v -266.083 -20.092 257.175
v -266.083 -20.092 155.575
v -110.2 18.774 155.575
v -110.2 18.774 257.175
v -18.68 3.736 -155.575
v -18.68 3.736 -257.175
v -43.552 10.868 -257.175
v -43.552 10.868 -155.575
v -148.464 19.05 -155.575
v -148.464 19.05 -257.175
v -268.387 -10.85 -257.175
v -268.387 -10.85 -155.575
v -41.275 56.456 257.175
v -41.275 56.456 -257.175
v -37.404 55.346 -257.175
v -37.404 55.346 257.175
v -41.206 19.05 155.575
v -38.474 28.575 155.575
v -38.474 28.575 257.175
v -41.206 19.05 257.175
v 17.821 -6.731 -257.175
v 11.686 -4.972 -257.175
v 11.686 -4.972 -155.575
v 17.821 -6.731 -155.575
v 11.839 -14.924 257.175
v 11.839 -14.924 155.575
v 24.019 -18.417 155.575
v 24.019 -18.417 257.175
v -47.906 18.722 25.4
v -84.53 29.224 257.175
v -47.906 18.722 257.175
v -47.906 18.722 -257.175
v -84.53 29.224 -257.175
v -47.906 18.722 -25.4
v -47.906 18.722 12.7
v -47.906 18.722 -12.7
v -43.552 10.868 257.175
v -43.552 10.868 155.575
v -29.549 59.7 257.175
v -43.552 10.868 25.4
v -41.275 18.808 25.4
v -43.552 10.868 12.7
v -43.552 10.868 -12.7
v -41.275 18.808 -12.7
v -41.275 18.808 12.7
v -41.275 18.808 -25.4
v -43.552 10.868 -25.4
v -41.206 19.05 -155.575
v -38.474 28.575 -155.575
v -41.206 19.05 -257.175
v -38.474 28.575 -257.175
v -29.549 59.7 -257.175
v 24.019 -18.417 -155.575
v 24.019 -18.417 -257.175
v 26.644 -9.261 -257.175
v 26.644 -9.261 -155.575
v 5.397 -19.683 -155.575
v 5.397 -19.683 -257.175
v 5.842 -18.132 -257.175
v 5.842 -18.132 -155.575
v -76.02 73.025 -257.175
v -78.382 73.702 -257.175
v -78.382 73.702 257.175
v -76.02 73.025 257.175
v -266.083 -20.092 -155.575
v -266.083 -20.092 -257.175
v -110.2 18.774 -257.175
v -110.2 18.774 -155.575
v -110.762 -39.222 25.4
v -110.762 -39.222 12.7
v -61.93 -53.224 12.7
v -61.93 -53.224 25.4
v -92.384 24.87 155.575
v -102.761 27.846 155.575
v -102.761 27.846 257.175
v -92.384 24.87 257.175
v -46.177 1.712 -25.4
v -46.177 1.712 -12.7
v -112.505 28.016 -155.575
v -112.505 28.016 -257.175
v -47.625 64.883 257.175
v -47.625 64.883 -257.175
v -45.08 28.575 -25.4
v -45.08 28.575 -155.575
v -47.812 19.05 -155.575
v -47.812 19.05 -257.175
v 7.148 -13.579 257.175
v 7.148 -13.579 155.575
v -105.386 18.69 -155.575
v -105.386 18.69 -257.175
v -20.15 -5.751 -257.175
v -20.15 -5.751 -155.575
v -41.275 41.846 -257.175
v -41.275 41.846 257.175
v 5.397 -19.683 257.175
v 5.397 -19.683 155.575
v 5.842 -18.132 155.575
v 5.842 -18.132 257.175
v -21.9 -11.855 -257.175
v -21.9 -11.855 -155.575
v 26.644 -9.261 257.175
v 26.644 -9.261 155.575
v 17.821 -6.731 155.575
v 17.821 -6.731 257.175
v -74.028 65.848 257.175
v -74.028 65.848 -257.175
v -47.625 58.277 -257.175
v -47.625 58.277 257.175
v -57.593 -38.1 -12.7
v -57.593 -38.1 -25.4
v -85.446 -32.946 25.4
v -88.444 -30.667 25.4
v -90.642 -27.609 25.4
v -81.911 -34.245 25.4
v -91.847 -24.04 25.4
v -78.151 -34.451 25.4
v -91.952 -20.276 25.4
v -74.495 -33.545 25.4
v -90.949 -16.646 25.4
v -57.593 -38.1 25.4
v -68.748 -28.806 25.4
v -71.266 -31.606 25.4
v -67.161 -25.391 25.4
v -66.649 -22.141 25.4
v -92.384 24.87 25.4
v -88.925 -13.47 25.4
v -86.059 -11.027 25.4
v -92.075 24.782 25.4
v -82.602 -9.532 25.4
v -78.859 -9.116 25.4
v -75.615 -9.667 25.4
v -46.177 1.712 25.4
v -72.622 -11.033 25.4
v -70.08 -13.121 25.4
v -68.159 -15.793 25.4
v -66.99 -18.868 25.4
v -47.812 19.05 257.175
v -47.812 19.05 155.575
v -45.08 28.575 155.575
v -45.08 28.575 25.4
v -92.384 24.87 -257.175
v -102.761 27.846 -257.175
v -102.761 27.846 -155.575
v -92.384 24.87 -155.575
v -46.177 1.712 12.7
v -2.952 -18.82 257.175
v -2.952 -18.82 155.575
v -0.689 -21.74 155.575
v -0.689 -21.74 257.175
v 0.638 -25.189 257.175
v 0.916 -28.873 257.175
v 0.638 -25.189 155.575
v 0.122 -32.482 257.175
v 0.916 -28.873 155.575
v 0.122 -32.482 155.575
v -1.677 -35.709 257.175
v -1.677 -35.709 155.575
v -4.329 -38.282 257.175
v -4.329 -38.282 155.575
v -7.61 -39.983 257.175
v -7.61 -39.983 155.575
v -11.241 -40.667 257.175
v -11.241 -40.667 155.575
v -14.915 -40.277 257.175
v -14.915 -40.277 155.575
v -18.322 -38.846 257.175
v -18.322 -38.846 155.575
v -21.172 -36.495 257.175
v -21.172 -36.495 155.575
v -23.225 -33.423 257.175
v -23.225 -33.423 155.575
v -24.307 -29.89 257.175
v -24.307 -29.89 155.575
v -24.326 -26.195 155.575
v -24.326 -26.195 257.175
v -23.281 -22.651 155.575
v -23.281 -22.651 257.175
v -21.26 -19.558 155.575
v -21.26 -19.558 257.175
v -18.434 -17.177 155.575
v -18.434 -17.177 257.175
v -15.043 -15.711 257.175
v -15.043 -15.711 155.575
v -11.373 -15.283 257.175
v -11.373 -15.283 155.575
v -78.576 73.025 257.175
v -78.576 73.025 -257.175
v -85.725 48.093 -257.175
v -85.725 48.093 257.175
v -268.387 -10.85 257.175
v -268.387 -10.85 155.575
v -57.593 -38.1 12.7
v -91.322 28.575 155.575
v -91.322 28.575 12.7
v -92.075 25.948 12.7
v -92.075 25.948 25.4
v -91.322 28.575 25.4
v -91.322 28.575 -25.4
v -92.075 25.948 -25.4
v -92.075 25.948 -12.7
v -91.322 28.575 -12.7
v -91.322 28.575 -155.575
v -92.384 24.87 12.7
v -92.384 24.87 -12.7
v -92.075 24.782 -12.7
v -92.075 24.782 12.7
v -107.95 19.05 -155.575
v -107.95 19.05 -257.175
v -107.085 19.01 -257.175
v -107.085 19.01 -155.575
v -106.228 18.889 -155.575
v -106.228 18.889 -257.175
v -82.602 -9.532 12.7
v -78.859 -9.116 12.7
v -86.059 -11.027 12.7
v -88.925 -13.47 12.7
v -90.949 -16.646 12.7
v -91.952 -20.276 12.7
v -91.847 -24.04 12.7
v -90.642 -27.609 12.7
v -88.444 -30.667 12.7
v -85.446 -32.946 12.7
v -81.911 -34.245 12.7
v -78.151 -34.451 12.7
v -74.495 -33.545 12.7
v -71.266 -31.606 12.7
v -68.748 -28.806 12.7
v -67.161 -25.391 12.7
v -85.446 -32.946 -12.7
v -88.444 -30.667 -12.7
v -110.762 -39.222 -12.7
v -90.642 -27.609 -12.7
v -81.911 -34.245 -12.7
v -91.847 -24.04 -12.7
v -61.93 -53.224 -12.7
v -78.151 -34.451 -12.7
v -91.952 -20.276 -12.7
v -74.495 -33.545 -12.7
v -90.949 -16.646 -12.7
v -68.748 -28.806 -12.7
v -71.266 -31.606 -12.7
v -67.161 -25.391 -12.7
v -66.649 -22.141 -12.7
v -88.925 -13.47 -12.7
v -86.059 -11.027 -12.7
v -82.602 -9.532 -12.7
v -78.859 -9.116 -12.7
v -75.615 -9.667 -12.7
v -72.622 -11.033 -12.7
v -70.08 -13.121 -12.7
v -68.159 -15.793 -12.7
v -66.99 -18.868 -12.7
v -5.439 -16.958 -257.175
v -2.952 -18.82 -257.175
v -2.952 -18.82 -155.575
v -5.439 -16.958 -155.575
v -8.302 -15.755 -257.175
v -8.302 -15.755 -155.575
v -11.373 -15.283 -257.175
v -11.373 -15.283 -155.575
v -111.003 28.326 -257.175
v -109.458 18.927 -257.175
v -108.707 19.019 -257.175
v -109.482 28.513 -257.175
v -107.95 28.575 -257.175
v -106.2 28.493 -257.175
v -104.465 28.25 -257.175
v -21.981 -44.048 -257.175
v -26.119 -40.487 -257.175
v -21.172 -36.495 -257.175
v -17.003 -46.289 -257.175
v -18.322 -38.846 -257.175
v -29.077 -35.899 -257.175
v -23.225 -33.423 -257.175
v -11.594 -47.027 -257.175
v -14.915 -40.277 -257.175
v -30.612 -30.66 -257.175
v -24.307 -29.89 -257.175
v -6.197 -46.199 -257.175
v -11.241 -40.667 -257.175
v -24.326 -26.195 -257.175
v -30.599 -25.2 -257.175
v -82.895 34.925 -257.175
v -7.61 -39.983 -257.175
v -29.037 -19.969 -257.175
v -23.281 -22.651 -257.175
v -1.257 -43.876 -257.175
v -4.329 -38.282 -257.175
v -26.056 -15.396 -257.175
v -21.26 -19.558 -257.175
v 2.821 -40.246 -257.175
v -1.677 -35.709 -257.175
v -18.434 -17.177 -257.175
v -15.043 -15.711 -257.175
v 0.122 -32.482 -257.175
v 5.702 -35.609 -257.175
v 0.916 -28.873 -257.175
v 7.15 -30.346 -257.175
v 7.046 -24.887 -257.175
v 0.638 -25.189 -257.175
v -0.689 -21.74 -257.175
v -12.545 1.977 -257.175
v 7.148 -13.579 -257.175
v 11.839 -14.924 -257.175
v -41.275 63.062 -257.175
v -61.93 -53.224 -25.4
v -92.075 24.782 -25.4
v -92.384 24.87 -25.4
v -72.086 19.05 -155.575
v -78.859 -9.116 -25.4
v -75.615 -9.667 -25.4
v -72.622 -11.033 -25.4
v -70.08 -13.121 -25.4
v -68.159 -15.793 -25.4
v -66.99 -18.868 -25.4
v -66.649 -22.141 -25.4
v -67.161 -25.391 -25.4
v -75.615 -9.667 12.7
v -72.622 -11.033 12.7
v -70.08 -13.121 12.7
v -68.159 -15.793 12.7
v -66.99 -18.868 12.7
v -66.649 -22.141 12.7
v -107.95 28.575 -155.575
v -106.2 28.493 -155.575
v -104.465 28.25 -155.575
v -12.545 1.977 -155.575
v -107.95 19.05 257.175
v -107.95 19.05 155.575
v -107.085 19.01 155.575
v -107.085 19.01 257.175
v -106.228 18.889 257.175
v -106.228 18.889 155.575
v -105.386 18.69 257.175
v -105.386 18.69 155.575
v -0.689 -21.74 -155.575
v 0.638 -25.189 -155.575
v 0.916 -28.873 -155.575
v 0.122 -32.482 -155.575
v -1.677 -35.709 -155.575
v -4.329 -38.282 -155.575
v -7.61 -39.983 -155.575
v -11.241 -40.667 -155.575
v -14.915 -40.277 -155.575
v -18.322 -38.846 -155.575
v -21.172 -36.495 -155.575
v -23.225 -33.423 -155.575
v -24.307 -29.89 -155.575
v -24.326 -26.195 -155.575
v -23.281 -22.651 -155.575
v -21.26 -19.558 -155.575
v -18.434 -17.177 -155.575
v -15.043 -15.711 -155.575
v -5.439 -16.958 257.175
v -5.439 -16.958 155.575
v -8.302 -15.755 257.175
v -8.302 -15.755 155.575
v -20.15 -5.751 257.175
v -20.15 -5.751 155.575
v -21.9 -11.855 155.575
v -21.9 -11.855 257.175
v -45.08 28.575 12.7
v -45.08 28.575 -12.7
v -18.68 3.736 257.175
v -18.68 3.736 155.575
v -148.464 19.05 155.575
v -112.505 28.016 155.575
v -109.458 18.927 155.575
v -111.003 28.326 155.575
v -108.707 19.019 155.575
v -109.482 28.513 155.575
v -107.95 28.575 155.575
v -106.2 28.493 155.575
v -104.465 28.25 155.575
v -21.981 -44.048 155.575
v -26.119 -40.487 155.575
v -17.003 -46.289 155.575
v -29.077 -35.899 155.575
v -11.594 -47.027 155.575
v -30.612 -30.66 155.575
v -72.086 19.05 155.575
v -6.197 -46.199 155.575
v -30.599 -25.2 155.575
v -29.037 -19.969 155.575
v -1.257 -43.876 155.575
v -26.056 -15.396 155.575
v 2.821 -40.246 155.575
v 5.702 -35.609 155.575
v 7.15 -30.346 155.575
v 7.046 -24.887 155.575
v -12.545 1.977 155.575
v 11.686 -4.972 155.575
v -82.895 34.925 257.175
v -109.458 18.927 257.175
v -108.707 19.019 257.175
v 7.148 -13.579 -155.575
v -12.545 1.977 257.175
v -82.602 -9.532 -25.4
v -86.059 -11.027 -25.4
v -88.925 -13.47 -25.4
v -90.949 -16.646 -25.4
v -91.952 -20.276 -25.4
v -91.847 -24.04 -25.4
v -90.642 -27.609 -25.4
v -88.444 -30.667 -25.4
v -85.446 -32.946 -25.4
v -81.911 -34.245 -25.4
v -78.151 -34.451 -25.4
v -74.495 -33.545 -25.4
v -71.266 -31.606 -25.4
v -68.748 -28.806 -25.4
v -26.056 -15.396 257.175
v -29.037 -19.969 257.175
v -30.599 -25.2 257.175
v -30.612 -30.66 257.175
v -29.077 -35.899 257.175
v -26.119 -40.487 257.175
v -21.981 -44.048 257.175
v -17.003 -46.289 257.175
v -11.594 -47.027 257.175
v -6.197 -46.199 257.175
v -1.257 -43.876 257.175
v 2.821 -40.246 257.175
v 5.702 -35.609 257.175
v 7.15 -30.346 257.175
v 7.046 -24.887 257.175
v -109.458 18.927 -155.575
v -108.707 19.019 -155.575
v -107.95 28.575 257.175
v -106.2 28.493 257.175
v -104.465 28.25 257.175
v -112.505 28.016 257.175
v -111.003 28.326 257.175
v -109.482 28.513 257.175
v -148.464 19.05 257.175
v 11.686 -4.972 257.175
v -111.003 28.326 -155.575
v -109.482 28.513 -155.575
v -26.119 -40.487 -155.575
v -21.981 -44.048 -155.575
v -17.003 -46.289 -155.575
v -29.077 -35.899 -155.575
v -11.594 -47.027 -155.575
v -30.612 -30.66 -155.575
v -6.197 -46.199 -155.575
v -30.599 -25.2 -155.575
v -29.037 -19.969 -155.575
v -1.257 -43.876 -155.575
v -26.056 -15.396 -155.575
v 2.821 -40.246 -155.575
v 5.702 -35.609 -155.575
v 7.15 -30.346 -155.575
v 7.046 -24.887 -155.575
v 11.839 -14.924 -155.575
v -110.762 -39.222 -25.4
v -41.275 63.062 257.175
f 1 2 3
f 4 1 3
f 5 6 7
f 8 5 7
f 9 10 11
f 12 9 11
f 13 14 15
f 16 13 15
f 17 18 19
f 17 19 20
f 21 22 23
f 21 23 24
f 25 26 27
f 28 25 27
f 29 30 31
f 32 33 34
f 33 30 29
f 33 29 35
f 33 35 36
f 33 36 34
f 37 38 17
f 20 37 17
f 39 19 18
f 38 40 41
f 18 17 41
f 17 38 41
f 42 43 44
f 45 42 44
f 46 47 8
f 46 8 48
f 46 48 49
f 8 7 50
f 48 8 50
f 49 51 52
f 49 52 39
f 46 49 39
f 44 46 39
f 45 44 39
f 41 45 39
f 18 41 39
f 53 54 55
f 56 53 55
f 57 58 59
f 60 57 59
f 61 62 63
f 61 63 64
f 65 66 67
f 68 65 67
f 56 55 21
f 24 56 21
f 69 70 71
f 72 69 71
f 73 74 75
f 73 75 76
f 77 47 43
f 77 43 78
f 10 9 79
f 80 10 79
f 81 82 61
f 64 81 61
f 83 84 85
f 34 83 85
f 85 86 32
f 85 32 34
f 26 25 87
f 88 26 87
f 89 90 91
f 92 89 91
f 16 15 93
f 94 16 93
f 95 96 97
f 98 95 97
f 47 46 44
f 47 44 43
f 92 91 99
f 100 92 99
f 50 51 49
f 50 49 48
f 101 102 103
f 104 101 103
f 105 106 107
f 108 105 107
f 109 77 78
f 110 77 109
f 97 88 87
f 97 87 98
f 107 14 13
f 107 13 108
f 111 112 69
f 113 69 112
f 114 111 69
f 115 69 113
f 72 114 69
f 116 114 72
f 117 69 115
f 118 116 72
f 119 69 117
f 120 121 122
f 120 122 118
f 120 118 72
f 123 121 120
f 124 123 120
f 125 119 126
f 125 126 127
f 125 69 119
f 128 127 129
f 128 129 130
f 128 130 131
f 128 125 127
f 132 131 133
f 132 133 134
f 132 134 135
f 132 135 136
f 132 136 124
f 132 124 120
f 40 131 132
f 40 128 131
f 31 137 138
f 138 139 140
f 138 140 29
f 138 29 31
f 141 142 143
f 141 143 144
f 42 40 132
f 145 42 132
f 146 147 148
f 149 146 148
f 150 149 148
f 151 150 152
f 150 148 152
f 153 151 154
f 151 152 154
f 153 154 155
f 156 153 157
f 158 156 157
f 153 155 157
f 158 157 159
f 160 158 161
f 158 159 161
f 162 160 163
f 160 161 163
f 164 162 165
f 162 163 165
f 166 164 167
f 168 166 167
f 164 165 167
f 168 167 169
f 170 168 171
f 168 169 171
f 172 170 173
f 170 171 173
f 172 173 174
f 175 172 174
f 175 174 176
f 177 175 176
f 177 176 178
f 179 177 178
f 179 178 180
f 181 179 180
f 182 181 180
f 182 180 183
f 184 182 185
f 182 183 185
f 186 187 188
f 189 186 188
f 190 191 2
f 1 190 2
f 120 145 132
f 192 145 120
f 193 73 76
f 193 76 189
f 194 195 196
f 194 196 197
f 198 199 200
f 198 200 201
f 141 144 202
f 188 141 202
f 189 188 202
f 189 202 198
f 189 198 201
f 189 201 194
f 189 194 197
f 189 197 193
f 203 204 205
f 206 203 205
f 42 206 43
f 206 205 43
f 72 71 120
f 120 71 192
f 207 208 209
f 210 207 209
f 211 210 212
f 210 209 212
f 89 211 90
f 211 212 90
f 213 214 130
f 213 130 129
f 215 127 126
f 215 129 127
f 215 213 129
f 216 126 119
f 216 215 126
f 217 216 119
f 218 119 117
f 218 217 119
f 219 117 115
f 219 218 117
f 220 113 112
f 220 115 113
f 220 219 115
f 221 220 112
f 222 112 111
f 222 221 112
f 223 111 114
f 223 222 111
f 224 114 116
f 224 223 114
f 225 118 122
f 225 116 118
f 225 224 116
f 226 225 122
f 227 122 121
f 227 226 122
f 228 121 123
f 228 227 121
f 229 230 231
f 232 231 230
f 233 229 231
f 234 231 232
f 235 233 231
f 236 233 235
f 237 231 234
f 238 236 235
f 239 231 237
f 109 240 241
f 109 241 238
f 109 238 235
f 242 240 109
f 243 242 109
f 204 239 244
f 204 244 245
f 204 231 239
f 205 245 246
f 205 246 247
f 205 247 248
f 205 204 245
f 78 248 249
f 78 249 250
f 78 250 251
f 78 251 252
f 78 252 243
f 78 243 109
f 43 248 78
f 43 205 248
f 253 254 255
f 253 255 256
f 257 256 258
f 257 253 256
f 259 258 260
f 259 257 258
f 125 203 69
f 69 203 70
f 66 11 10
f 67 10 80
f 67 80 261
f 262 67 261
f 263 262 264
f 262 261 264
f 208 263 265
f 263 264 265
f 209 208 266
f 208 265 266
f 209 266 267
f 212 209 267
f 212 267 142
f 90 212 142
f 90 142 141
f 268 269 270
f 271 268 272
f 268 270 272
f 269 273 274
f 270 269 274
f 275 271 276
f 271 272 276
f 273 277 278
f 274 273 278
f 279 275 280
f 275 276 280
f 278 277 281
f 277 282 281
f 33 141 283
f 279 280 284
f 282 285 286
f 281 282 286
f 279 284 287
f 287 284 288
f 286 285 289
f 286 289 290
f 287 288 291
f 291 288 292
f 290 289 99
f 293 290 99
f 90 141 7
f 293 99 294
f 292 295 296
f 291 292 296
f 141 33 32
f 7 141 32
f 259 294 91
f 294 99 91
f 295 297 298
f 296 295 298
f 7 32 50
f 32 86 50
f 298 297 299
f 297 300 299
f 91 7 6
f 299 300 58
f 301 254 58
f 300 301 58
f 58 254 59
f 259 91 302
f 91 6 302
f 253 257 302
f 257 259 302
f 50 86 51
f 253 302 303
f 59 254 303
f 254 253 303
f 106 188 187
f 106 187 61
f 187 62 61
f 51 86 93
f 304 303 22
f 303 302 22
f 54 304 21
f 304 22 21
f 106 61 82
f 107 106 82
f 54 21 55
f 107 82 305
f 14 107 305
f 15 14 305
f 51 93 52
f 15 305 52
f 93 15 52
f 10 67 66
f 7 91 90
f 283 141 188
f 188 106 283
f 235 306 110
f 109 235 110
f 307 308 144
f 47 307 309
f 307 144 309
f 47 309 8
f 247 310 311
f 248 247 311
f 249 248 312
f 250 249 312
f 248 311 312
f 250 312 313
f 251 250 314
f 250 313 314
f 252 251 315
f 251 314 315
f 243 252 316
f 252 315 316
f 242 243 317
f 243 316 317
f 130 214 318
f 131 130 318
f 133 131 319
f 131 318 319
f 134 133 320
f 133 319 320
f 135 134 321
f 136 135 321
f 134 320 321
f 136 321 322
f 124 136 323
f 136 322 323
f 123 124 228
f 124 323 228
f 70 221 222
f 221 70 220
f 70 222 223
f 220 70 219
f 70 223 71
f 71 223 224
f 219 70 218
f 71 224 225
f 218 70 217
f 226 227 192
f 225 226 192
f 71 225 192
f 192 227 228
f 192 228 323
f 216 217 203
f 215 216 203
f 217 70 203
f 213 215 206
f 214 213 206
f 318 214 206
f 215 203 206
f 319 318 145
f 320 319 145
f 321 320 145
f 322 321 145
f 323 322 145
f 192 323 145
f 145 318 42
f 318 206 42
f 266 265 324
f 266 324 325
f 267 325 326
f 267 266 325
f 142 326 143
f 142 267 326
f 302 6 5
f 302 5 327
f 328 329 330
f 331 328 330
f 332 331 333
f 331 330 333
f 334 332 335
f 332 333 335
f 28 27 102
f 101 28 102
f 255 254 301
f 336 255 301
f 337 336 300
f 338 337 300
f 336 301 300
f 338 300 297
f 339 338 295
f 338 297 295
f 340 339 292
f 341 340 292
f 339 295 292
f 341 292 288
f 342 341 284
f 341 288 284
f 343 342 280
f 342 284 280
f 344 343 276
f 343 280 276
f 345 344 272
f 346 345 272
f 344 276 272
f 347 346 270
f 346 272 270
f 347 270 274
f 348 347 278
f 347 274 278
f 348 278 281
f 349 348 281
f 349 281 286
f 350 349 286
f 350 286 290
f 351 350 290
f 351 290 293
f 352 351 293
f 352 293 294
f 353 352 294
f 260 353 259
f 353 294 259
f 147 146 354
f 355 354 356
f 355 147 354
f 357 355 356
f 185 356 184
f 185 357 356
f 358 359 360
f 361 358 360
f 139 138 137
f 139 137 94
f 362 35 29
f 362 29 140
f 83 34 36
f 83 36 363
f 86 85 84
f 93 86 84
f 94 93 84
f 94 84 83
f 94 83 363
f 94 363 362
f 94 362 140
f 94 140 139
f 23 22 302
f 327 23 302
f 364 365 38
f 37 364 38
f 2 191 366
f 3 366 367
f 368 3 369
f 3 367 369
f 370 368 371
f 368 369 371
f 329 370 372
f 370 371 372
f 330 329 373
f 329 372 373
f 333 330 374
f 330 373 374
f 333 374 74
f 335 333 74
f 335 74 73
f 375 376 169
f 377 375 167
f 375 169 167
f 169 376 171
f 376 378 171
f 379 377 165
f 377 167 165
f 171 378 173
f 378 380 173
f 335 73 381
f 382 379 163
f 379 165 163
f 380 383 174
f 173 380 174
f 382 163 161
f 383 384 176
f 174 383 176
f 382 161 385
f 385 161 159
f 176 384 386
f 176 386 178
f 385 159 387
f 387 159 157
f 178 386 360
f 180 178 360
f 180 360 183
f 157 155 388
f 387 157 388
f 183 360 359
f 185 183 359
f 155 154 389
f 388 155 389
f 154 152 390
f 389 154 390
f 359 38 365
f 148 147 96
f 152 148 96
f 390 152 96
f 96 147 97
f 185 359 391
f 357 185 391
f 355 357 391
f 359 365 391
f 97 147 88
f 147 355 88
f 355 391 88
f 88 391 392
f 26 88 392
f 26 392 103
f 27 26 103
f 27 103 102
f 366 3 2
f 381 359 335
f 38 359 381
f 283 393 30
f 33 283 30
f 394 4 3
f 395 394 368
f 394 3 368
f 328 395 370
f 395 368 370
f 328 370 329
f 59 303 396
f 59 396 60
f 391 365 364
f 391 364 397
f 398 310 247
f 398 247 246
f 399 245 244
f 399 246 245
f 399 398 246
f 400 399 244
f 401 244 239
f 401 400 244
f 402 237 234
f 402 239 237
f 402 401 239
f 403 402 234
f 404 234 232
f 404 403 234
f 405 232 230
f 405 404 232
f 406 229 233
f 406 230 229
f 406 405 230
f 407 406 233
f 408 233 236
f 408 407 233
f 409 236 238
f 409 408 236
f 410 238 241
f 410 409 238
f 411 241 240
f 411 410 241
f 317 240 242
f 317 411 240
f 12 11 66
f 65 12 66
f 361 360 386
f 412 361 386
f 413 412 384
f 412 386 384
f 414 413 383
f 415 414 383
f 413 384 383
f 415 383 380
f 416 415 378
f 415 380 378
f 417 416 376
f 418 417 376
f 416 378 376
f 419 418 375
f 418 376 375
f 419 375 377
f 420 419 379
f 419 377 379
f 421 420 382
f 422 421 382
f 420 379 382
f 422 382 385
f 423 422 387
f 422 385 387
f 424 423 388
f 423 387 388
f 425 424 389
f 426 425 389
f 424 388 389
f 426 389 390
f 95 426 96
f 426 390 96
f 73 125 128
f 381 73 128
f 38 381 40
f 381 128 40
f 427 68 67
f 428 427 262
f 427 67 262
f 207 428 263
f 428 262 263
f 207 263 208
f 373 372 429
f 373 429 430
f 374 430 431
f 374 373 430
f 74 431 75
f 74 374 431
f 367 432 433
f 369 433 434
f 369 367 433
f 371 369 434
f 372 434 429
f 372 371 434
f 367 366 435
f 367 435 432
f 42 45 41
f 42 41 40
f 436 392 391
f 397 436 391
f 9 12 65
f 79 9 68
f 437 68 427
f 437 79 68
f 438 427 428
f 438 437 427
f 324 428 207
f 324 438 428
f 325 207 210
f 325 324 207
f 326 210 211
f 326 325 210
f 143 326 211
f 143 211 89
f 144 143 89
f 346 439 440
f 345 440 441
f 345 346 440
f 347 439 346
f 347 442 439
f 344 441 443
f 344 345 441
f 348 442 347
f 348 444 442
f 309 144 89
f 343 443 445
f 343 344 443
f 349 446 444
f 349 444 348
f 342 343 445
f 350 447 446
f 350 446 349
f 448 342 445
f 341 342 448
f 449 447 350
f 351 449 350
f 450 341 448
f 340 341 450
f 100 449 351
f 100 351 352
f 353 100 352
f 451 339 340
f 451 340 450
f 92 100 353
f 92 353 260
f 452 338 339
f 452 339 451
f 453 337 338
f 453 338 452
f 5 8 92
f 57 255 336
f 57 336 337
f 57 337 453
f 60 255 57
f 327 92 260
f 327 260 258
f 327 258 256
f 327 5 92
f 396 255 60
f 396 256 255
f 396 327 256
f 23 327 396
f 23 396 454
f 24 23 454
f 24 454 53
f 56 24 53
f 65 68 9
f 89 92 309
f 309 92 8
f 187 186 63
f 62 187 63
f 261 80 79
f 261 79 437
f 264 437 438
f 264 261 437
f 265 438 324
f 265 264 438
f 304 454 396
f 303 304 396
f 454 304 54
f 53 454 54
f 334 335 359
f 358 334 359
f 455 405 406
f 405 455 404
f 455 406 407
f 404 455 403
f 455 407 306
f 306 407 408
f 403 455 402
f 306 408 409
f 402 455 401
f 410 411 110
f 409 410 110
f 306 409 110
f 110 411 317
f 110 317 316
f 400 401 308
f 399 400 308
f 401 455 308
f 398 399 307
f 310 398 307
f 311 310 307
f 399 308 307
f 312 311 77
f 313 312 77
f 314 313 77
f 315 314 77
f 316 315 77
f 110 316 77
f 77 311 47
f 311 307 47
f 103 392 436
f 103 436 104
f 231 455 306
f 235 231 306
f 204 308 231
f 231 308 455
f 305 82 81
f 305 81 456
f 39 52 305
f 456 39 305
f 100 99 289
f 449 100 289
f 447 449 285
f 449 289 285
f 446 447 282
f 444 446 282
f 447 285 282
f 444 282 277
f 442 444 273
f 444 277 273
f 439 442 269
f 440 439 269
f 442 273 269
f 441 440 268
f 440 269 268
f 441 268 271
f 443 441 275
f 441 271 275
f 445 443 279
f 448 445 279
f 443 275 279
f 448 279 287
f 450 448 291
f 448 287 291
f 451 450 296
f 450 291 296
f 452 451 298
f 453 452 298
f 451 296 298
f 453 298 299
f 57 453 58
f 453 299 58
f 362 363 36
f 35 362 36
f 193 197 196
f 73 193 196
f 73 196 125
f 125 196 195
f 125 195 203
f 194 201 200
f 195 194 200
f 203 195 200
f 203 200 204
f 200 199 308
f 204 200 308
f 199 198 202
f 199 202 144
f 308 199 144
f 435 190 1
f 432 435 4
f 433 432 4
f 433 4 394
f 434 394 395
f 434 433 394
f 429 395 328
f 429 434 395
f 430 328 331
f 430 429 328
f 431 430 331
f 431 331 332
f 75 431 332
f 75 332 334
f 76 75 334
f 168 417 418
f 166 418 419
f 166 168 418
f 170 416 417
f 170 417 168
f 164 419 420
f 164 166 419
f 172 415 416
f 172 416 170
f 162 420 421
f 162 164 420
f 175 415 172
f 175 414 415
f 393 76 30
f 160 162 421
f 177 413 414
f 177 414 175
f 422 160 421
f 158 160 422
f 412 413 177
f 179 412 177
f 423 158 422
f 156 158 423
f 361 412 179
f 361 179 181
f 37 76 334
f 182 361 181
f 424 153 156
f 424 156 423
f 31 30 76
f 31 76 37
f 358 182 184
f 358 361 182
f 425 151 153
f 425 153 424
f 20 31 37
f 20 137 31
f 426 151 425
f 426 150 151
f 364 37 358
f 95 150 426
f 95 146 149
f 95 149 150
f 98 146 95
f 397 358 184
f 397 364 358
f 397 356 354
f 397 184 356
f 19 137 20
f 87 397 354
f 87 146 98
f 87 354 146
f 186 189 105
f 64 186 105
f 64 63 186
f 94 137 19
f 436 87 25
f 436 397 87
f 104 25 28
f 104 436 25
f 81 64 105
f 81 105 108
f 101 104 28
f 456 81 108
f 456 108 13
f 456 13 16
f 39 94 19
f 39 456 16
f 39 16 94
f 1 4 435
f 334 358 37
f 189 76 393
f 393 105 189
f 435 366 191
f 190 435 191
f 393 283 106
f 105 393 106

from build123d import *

# Parameters (mm, degrees)
SKETCH1_R               = 19.05
SKETCH1_R_2             = 12.7
EXTRUDE1_DEPTH          = 257.175
SKETCH2_W               = 304.8
SKETCH2_H               = 101.6
EXTRUDE2_DEPTH          = 9.525
EXTRUDE2_2_DEPTH        = 9.525
SKETCH3_W               = 50.8
SKETCH3_H               = 66.675
SKETCH3_R               = 12.7
EXTRUDE3_DEPTH          = 25.4
SKETCH4_W               = 50.8
SKETCH4_H               = 25.4
CUT_EXTRUDE1_DEPTH      = 66.675
CUT_EXTRUDE2_DEPTH      = 378.023730188
CUT_EXTRUDE2_DEPTH_BACK = 378.023730188
SKETCH5_W               = 38.1
SKETCH5_H               = 311.15
EXTRUDE4_START          = -257.175
SKETCH7_W               = 50.8
SKETCH7_H               = 50.8
SKETCH7_W_2             = 38.1
SKETCH7_H_2             = 38.1
EXTRUDE4_DEPTH          = 514.35
SKETCH9_W               = 28.398063314
SKETCH9_H               = 6.35
EXTRUDE5_DEPTH          = 101.6
SKETCH10_W              = 28.398063314
SKETCH10_H              = 6.35
EXTRUDE6_DEPTH          = 101.6
FLEX1_START             = -257.175
FLEX1_DEPTH             = 514.35
FLEX1_START_2           = -25.4
FLEX1_2_DEPTH           = 50.8
FLEX1_3_DEPTH           = 514.35
FLEX1_4_DEPTH           = 101.6
FLEX1_START_3           = 155.575
FLEX1_5_DEPTH           = 101.6
FLEX1_6_DEPTH           = 12.7
FLEX1_START_4           = 12.7
FLEX1_7_DEPTH           = 12.7


# Read off the part's stored shape, not the designer's step: Flex1
with BuildPart() as part:
    # Sketch1 → Extrude1 (new, symmetric)
    with BuildSketch(Plane.XY):
        Circle(SKETCH1_R)
        Circle(SKETCH1_R_2, mode=Mode.SUBTRACT)
    extrude(amount=EXTRUDE1_DEPTH, both=True)

    # Sketch5 → Cut-Extrude2 (cut, two sides: drawn at the far end of the back side and taken through both)
    with BuildSketch(Plane(origin=(0, 0, 0), x_dir=(1, 0, 0), z_dir=(0, 1, 0)).offset(-CUT_EXTRUDE2_DEPTH_BACK)):
        Rectangle(SKETCH5_W, SKETCH5_H)
    extrude(amount=CUT_EXTRUDE2_DEPTH + CUT_EXTRUDE2_DEPTH_BACK, mode=Mode.SUBTRACT)


with BuildPart() as body_2:
    # Sketch2 → Extrude2 (new body)
    with BuildSketch(Plane(origin=(0, 19.05, 0), x_dir=(-1, 0, 0), z_dir=(0, 1, 0))):
        with Locations((120.65, 206.375)):
            Rectangle(SKETCH2_W, SKETCH2_H)
    extrude(amount=EXTRUDE2_DEPTH)



with BuildPart() as body_3:
    # Sketch2 → Extrude2 2 (new body)
    with BuildSketch(Plane(origin=(0, 19.05, 0), x_dir=(-1, 0, 0), z_dir=(0, 1, 0))):
        with Locations((120.65, -206.375)):
            Rectangle(SKETCH2_W, SKETCH2_H)
    extrude(amount=EXTRUDE2_2_DEPTH)


with BuildPart() as body_4:
    # Sketch3 → Extrude3 (new, symmetric)
    with BuildSketch(Plane.XY):
        with Locations((-66.675, -4.7625)):
            Rectangle(SKETCH3_W, SKETCH3_H)
        with Locations((-66.675, -12.7)):
            Circle(SKETCH3_R, mode=Mode.SUBTRACT)
    extrude(amount=EXTRUDE3_DEPTH, both=True)

    # Sketch4 → Cut-Extrude1 (cut)
    with BuildSketch(Plane(origin=(0, 28.575, 0), x_dir=(-1, 0, 0), z_dir=(0, 1, 0))):
        with Locations((66.675, 0)):
            Rectangle(SKETCH4_W, SKETCH4_H)
    extrude(amount=-CUT_EXTRUDE1_DEPTH, mode=Mode.SUBTRACT)


with BuildPart() as cut_extrude1_piece_1:
    # of the separate pieces the step leaves, piece 1, a body of its own (cut_extrude1_pieces)
    add(body_4.part.solids().sort_by_distance((-92.075, 28.575, 25.4))[0])


with BuildPart() as cut_extrude1_piece_2:
    # of the separate pieces the step leaves, piece 2, a body of its own (cut_extrude1_pieces)
    add(body_4.part.solids().sort_by_distance((-92.075, 28.575, -12.7))[0])


with BuildPart() as cut_extrude2_piece_1:
    # of the separate pieces the step leaves, piece 1, a body of its own (cut_extrude2_pieces)
    add(part.part.solids().sort_by_distance((19.05, 0, 155.575))[0])


with BuildPart() as cut_extrude2_piece_2:
    # of the separate pieces the step leaves, piece 2, a body of its own (cut_extrude2_pieces)
    add(part.part.solids().sort_by_distance((19.05, 0, -257.175))[0])


with BuildPart() as body_2_1:
    add(body_2.part)

    add(body_3.part)  # Extrude4 merges body 3

    add(cut_extrude1_piece_1.part)  # Extrude4 merges Cut-Extrude1 piece 1

    add(cut_extrude1_piece_2.part)  # Extrude4 merges Cut-Extrude1 piece 2
    # Sketch7 → Extrude4 (add)
    with BuildSketch(Plane.XY.offset(EXTRUDE4_START)):
        with Locations((-66.675, 53.975)):
            Rectangle(SKETCH7_W, SKETCH7_H)
        with Locations((-66.675, 53.975)):
            Rectangle(SKETCH7_W_2, SKETCH7_H_2, mode=Mode.SUBTRACT)
    extrude(amount=EXTRUDE4_DEPTH)


    add(cut_extrude2_piece_1.part)  # Extrude5 merges Cut-Extrude2 piece 1
    # Sketch9 → Extrude5 (add)
    with BuildSketch(Plane.XY.offset(257.175)):
        with Locations((0, 15.875)):
            Rectangle(SKETCH9_W, SKETCH9_H)
    extrude(amount=-EXTRUDE5_DEPTH)


    add(cut_extrude2_piece_2.part)  # Extrude6 merges Cut-Extrude2 piece 2
    # Sketch10 → Extrude6 (add)
    with BuildSketch(Plane(origin=(0, 0, -257.175), x_dir=(-1, 0, 0), z_dir=(0, 0, -1))):
        with Locations((0, 15.875)):
            Rectangle(SKETCH10_W, SKETCH10_H)
    extrude(amount=-EXTRUDE6_DEPTH)

    # Flex1 outline → Flex1 (cut)
    with BuildSketch(Plane.XY.offset(FLEX1_START)):
        with BuildLine():
            Line((-148.464280876, 19.05), (-112.504520793, 28.015775164))
            ThreePointArc((-112.504520793, 28.015775164), (-110.244362224, 28.434670795), (-107.949999999, 28.575))
            Line((-107.949999999, 28.575), (-273.05, 28.575))
            Line((-273.05, 28.575), (-273.05, 19.05))
            Line((-273.05, 19.05), (-148.464280876, 19.05))
        make_face()
        with BuildLine():
            Line((-92.075, 28.575), (-107.949999999, 28.575))
            ThreePointArc((-107.949999999, 28.575), (-105.32987014, 28.391782672), (-102.760738129, 27.845696805))
            Line((-102.760738129, 27.845696805), (-92.383918122, 24.870191549))
            Line((-92.383918122, 24.870191549), (-85.725, 48.092598787))
            Line((-85.725, 48.092598787), (-85.725, 73.025))
            Line((-85.725, 73.025), (-78.575748996, 73.025))
            Line((-78.575748996, 73.025), (-78.381540446, 73.702285703))
            Line((-78.381540446, 73.702285703), (-76.019564503, 73.025))
            Line((-76.019564503, 73.025), (-47.625, 73.025))
            Line((-47.625, 73.025), (-47.625, 64.882989648))
            Line((-47.625, 64.882989648), (-41.275, 63.062156448))
            Line((-41.275, 63.062156448), (-41.275, 79.375))
            Line((-41.275, 79.375), (-92.075, 79.375))
            Line((-92.075, 79.375), (-92.075, 28.575))
        make_face()
        Polygon((-41.275, 41.845558685), (-41.275, 56.456255031), (-47.625, 58.277088231), (-47.625, 34.925), (-82.894846776, 34.925), (-84.529609143, 29.223906109), (-47.905538528, 18.722122852), align=None)
        Polygon((-41.275, 18.808042667), (-43.551823968, 10.867813874), (-41.275, 10.214945107), align=None)
        Polygon((-41.275, 0.30609298), (-46.177269782, 1.71179622), (-57.593118647, -38.1), (-41.275, -38.1), align=None)
        with BuildLine():
            Line((31.75, 28.575), (-38.474370052, 28.575))
            Line((-38.474370052, 28.575), (-41.205619851, 19.05))
            Line((-41.205619851, 19.05), (-14.199031657, 19.05))
            Line((-14.199031657, 19.05), (-14.199031657, 12.7))
            ThreePointArc((-14.199031657, 12.7), (-17.039583869, 8.517927071), (-18.680073508, 3.735954194))
            Line((-18.680073508, 3.735954194), (-12.545207206, 1.976809589))
            ThreePointArc((-12.545207206, 1.976809589), (3.500594419, 12.208023538), (11.68648857, -4.971517364))
            Line((11.68648857, -4.971517364), (17.821354872, -6.730661968))
            ThreePointArc((17.821354872, -6.730661968), (18.727358182, 3.49121118), (14.199031657, 12.7))
            Line((14.199031657, 12.7), (14.199031657, 19.05))
            Line((14.199031657, 19.05), (31.75, 19.05))
            Line((31.75, 19.05), (31.75, 28.575))
        make_face()
        with BuildLine():
            ThreePointArc((-2.952497042, -18.81981034), (-6.833637138, -16.268248219), (-11.372655614, -15.28284019))
            ThreePointArc((-11.372655614, -15.28284019), (-7.377671659, -17.563384096), (-2.952497042, -18.81981034))
        make_face()
        with BuildLine():
            Line((7.147791969, -13.578919183), (5.842203325, -18.13204788))
            ThreePointArc((5.842203325, -18.13204788), (8.985100393, -16.797930555), (11.839365268, -14.924206178))
            Line((11.839365268, -14.924206178), (7.147791969, -13.578919183))
        make_face()
        with BuildLine():
            ThreePointArc((-67.160894994, -25.390701559), (-76.987343342, -20.112528233), (-78.858907912, -9.116372229))
            ThreePointArc((-78.858907912, -9.116372229), (-89.657146248, -29.219602021), (-67.160894994, -25.390701559))
        make_face()
    extrude(amount=FLEX1_DEPTH, mode=Mode.SUBTRACT)

    # Flex1 2 outline → Flex1 2 (cut)
    with BuildSketch(Plane.XY.offset(FLEX1_START_2)):
        Polygon((-41.275, 10.214945107), (-43.551823968, 10.867813874), (-46.177269782, 1.71179622), (-41.275, 0.30609298), align=None)
    extrude(amount=FLEX1_2_DEPTH, mode=Mode.SUBTRACT)

    # Flex1 3 outline → Flex1 3 (add)
    with BuildSketch(Plane.XY.offset(FLEX1_START)):
        Polygon((-92.383918122, 24.870191549), (-43.551823968, 10.867813874), (-29.549446293, 59.699908027), (-41.275, 63.062156448), (-41.275, 56.456255031), (-37.403755271, 55.346193468), (-41.275, 41.845558685), (-41.275, 28.575), (-45.080271469, 28.575), (-47.905538528, 18.722122852), (-82.266604606, 28.575), (-91.321581393, 28.575), align=None)
        Polygon((-78.575748996, 73.025), (-85.725, 48.092598787), (-85.725, 34.925), (-82.894846776, 34.925), (-74.027825886, 65.847976724), (-47.625, 58.277088231), (-47.625, 64.882989648), (-76.019564503, 73.025), align=None)
    extrude(amount=FLEX1_3_DEPTH)

    # Flex1 4 outline → Flex1 4 (add)
    with BuildSketch(Plane.XY.offset(FLEX1_START)):
        with BuildLine():
            Line((-107.949999997, 19.05), (-148.464280876, 19.05))
            Line((-148.464280876, 19.05), (-268.387380698, -10.850186973))
            Line((-268.387380698, -10.850186973), (-266.083074643, -20.092253766))
            Line((-266.083074643, -20.092253766), (-110.200214738, 18.773708371))
            ThreePointArc((-110.200214738, 18.773708371), (-109.083556727, 18.9806687), (-107.949999997, 19.05))
        make_face()
        with BuildLine():
            ThreePointArc((-107.949999997, 19.05), (-106.655493926, 18.959479317), (-105.386183943, 18.689679151))
            Line((-105.386183943, 18.689679151), (-20.150178534, -5.7513521))
            Line((-20.150178534, -5.7513521), (-21.900475743, -11.85536387))
            ThreePointArc((-21.900475743, -11.85536387), (-17.002976538, -46.289206257), (5.39749476, -19.682930952))
            Line((5.39749476, -19.682930952), (5.842203325, -18.13204788))
            ThreePointArc((5.842203325, -18.13204788), (1.485212073, -18.992015299), (-2.952497042, -18.81981034))
            ThreePointArc((-2.952497042, -18.81981034), (-16.670532684, -39.686093679), (-11.372655614, -15.28284019))
            ThreePointArc((-11.372655614, -15.28284019), (-17.782583245, -6.832439764), (-18.680073508, 3.735954194))
            Line((-18.680073508, 3.735954194), (-43.551823968, 10.867813874))
            Line((-43.551823968, 10.867813874), (-72.086498047, 19.05))
            Line((-72.086498047, 19.05), (-107.949999997, 19.05))
        make_face()
        with BuildLine():
            Line((11.68648857, -4.971517364), (-12.545207206, 1.976809589))
            ThreePointArc((-12.545207206, 1.976809589), (-3.500594419, -12.208023538), (11.68648857, -4.971517364))
        make_face()
        with BuildLine():
            Line((26.644311378, -9.260604035), (17.821354872, -6.730661968))
            ThreePointArc((17.821354872, -6.730661968), (15.385809094, -11.232959473), (11.839365268, -14.924206178))
            Line((11.839365268, -14.924206178), (24.018865564, -18.416621689))
            Line((24.018865564, -18.416621689), (26.644311378, -9.260604035))
        make_face()
    extrude(amount=FLEX1_4_DEPTH)

    # Flex1 5 outline → Flex1 5 (add)
    with BuildSketch(Plane.XY.offset(FLEX1_START_3)):
        with BuildLine():
            Line((-107.949999997, 19.05), (-148.464280876, 19.05))
            Line((-148.464280876, 19.05), (-268.387380698, -10.850186973))
            Line((-268.387380698, -10.850186973), (-266.083074643, -20.092253766))
            Line((-266.083074643, -20.092253766), (-110.200214738, 18.773708371))
            ThreePointArc((-110.200214738, 18.773708371), (-109.083556727, 18.9806687), (-107.949999997, 19.05))
        make_face()
        with BuildLine():
            ThreePointArc((-107.949999997, 19.05), (-106.655493926, 18.959479317), (-105.386183943, 18.689679151))
            Line((-105.386183943, 18.689679151), (-20.150178534, -5.7513521))
            Line((-20.150178534, -5.7513521), (-21.900475743, -11.85536387))
            ThreePointArc((-21.900475743, -11.85536387), (-17.002976538, -46.289206257), (5.39749476, -19.682930952))
            Line((5.39749476, -19.682930952), (5.842203325, -18.13204788))
            ThreePointArc((5.842203325, -18.13204788), (1.485212073, -18.992015299), (-2.952497042, -18.81981034))
            ThreePointArc((-2.952497042, -18.81981034), (-16.670532684, -39.686093679), (-11.372655614, -15.28284019))
            ThreePointArc((-11.372655614, -15.28284019), (-17.782583245, -6.832439764), (-18.680073508, 3.735954194))
            Line((-18.680073508, 3.735954194), (-43.551823968, 10.867813874))
            Line((-43.551823968, 10.867813874), (-72.086498047, 19.05))
            Line((-72.086498047, 19.05), (-107.949999997, 19.05))
        make_face()
        with BuildLine():
            Line((11.68648857, -4.971517364), (-12.545207206, 1.976809589))
            ThreePointArc((-12.545207206, 1.976809589), (-3.500594419, -12.208023538), (11.68648857, -4.971517364))
        make_face()
        with BuildLine():
            Line((26.644311378, -9.260604035), (17.821354872, -6.730661968))
            ThreePointArc((17.821354872, -6.730661968), (15.385809094, -11.232959473), (11.839365268, -14.924206178))
            Line((11.839365268, -14.924206178), (24.018865564, -18.416621689))
            Line((24.018865564, -18.416621689), (26.644311378, -9.260604035))
        make_face()
    extrude(amount=FLEX1_5_DEPTH)

    # Flex1 6 outline → Flex1 6 (add)
    with BuildSketch(Plane.XY.offset(FLEX1_START_2)):
        Polygon((-92.075, 24.781610703), (-92.383918122, 24.870191549), (-110.762038821, -39.221932028), (-61.929944667, -53.224309703), (-57.593118647, -38.1), (-92.075, -38.1), align=None)
        with BuildLine():
            ThreePointArc((-78.858907912, -9.116372229), (-69.032459564, -14.394545555), (-67.160894994, -25.390701559))
            ThreePointArc((-67.160894994, -25.390701559), (-56.362656658, -5.287471767), (-78.858907912, -9.116372229))
        make_face()
    extrude(amount=FLEX1_6_DEPTH)

    # Flex1 7 outline → Flex1 7 (add)
    with BuildSketch(Plane.XY.offset(FLEX1_START_4)):
        Polygon((-92.075, 24.781610703), (-92.383918122, 24.870191549), (-110.762038821, -39.221932028), (-61.929944667, -53.224309703), (-57.593118647, -38.1), (-92.075, -38.1), align=None)
        with BuildLine():
            ThreePointArc((-78.858907912, -9.116372229), (-69.032459564, -14.394545555), (-67.160894994, -25.390701559))
            ThreePointArc((-67.160894994, -25.390701559), (-56.362656658, -5.287471767), (-78.858907912, -9.116372229))
        make_face()
    extrude(amount=FLEX1_7_DEPTH)


solid = body_2_1.part
